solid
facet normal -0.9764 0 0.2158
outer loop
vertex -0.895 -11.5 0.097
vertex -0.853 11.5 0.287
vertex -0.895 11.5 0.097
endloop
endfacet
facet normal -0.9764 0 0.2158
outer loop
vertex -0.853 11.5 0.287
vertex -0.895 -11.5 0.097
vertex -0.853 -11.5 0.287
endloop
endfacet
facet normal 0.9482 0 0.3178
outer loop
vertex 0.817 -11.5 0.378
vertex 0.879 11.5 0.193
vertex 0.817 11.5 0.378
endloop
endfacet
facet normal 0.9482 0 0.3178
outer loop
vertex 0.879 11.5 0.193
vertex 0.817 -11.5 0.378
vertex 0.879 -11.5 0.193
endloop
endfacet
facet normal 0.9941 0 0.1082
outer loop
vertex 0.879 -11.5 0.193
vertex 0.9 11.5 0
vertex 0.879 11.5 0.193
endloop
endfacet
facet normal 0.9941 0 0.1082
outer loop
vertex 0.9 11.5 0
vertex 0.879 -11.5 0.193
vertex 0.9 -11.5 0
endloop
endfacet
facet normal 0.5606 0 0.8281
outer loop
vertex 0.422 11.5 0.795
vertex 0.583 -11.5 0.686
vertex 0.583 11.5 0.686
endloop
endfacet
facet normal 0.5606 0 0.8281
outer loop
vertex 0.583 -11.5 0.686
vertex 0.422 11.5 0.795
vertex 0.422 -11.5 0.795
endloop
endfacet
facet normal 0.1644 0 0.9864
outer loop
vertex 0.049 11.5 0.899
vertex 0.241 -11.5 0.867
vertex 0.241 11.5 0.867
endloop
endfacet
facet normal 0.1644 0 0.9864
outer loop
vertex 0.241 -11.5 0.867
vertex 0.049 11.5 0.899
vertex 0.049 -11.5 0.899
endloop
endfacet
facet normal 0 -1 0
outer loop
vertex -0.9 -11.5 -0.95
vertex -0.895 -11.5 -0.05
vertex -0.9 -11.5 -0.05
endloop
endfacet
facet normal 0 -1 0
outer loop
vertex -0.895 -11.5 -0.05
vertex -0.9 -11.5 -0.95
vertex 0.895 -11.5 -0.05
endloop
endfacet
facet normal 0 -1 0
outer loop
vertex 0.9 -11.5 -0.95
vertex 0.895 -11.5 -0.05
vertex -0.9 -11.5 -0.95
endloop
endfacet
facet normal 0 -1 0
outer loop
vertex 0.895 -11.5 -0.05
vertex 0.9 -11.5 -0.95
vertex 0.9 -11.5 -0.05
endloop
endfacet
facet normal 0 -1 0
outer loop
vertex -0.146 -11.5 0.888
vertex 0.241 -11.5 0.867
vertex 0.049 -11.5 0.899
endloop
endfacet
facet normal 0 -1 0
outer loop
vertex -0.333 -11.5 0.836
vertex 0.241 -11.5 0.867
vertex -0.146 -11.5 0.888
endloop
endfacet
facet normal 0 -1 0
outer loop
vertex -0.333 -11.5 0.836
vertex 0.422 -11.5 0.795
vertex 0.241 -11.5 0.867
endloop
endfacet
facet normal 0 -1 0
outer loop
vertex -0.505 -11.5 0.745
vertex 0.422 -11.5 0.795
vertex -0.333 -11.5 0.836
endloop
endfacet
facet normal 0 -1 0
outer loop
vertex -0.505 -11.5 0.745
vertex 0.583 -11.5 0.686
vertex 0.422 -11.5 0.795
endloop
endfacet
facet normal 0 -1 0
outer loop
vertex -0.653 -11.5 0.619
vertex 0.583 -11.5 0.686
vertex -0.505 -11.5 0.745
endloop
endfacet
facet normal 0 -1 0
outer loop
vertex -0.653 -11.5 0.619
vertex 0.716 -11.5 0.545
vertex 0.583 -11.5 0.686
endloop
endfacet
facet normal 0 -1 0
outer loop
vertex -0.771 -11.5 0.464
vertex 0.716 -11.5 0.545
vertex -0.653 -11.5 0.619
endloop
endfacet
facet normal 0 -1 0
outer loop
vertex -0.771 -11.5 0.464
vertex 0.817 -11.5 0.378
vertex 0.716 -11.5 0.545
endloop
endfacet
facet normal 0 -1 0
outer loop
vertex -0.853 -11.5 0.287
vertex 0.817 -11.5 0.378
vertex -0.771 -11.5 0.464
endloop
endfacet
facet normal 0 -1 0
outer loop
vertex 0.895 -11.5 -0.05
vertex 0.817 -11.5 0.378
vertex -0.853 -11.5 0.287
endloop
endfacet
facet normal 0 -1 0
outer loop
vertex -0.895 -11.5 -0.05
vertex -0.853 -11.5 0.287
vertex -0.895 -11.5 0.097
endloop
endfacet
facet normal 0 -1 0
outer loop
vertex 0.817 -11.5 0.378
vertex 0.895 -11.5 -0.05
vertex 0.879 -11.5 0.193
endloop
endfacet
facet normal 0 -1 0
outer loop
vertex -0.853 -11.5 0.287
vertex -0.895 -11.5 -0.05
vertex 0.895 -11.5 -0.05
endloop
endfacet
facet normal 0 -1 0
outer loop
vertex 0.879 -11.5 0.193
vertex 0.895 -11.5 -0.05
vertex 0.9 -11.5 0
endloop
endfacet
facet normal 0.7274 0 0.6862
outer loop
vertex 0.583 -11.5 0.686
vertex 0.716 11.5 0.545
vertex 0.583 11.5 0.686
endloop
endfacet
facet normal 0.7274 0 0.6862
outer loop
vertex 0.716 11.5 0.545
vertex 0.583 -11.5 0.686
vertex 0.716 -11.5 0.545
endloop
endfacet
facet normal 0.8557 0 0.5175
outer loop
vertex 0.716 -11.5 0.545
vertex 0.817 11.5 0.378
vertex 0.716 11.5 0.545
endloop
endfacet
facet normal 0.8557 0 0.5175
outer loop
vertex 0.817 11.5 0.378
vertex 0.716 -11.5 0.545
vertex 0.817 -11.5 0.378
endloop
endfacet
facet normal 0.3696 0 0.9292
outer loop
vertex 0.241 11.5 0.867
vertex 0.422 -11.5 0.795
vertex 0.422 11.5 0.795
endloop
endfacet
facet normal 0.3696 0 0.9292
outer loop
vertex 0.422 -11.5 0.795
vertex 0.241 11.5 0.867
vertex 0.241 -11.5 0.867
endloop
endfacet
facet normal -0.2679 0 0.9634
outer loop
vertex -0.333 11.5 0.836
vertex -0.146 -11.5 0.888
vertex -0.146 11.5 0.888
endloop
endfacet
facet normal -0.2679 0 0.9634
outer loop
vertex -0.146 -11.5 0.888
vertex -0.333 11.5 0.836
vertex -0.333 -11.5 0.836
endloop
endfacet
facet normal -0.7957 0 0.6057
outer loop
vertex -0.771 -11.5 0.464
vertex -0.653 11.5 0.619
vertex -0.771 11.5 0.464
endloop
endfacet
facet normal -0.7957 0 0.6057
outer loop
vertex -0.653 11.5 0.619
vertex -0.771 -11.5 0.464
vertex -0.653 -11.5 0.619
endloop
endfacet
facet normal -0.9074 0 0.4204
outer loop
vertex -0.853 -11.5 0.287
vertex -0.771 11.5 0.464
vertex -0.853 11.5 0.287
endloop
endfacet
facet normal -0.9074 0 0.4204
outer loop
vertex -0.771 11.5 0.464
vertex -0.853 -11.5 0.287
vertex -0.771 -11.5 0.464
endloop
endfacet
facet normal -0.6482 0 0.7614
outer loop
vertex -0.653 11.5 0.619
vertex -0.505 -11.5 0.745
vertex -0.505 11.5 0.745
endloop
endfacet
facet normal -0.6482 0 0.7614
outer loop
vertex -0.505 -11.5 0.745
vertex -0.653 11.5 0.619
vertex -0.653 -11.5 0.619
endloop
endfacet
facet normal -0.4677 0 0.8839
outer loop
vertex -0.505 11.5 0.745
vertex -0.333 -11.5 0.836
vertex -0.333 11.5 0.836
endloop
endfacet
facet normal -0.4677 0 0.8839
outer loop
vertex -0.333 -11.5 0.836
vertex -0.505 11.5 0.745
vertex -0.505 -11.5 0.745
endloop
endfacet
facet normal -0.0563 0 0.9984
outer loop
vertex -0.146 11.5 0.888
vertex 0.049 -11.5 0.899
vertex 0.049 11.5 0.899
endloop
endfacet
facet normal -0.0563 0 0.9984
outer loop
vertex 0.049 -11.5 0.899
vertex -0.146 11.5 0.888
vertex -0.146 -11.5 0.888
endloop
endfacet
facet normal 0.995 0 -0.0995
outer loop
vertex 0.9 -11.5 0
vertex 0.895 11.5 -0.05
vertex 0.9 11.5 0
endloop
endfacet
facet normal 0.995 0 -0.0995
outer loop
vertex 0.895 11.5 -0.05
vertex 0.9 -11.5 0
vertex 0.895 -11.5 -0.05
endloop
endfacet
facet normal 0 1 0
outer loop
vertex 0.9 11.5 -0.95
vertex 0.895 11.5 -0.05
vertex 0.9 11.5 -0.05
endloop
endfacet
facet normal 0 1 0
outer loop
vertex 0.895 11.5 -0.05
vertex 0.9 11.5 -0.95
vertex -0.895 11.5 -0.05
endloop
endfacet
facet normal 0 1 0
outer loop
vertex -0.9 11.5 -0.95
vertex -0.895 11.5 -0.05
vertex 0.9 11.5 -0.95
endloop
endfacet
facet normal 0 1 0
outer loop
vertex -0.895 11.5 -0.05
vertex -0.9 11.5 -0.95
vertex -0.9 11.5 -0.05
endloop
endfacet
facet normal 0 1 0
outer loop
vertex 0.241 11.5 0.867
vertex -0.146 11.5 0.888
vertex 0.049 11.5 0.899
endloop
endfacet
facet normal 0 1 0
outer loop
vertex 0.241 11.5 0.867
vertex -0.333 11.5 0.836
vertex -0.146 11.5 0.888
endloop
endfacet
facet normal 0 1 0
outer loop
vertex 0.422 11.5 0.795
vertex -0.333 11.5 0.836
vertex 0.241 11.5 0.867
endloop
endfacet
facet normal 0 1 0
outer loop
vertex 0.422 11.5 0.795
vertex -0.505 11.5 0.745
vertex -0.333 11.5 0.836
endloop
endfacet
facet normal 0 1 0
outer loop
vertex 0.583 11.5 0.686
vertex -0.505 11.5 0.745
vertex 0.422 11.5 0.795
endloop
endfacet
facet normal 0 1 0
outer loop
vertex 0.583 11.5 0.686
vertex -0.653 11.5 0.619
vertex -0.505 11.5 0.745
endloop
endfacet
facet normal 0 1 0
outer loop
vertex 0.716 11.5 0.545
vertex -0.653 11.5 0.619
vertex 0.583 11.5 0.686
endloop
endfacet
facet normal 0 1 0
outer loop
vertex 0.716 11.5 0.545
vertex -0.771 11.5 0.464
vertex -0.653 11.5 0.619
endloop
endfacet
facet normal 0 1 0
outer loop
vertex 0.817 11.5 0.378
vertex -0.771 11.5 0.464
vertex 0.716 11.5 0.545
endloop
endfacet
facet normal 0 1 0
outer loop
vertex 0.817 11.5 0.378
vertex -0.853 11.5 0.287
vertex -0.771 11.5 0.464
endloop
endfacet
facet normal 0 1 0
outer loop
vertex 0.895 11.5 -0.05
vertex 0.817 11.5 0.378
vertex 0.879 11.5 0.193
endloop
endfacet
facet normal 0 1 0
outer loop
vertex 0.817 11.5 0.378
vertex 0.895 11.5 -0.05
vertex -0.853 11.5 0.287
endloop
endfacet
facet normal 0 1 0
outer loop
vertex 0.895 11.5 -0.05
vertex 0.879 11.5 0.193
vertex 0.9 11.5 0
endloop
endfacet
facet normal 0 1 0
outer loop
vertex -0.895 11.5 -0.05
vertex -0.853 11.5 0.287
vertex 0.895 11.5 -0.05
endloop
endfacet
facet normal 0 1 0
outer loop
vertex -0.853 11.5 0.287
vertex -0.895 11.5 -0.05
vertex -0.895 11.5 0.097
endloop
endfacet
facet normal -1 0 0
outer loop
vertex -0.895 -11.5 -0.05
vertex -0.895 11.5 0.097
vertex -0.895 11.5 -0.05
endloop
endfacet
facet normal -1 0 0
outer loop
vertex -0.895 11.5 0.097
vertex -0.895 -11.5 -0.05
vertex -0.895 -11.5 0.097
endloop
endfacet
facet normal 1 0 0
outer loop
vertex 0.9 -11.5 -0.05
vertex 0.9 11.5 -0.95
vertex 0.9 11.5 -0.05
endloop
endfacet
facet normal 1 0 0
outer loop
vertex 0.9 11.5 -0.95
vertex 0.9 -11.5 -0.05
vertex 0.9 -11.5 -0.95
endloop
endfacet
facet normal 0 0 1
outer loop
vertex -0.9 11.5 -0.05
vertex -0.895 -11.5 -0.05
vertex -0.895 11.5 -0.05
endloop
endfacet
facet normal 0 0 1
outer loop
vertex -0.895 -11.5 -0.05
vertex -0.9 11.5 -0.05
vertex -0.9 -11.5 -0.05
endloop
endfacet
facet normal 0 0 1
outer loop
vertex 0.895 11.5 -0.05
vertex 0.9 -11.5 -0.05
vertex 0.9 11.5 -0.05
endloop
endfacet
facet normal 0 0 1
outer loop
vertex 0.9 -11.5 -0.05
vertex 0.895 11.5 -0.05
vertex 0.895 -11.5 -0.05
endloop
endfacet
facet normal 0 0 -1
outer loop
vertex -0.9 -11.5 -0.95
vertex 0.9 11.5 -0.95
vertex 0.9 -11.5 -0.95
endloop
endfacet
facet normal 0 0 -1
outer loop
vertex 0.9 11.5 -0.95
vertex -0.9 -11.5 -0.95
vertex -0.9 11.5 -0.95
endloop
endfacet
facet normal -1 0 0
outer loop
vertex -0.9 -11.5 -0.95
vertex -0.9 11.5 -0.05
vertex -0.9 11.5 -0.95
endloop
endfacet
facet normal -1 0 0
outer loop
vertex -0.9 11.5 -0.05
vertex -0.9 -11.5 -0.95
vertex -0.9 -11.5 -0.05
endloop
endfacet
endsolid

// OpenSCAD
/*

This is the plastic bar that holds the springs at the bottom of the camera mount (camera_mount.scad)

*/

$fa = 0.2;
$fs = 0.2;

bar_d = 1.8;
rotate([90,0,0]) cylinder(h=23, d=bar_d,center=true);
translate([0,0,-0.5]) cube([bar_d,23,0.9], center=true);
